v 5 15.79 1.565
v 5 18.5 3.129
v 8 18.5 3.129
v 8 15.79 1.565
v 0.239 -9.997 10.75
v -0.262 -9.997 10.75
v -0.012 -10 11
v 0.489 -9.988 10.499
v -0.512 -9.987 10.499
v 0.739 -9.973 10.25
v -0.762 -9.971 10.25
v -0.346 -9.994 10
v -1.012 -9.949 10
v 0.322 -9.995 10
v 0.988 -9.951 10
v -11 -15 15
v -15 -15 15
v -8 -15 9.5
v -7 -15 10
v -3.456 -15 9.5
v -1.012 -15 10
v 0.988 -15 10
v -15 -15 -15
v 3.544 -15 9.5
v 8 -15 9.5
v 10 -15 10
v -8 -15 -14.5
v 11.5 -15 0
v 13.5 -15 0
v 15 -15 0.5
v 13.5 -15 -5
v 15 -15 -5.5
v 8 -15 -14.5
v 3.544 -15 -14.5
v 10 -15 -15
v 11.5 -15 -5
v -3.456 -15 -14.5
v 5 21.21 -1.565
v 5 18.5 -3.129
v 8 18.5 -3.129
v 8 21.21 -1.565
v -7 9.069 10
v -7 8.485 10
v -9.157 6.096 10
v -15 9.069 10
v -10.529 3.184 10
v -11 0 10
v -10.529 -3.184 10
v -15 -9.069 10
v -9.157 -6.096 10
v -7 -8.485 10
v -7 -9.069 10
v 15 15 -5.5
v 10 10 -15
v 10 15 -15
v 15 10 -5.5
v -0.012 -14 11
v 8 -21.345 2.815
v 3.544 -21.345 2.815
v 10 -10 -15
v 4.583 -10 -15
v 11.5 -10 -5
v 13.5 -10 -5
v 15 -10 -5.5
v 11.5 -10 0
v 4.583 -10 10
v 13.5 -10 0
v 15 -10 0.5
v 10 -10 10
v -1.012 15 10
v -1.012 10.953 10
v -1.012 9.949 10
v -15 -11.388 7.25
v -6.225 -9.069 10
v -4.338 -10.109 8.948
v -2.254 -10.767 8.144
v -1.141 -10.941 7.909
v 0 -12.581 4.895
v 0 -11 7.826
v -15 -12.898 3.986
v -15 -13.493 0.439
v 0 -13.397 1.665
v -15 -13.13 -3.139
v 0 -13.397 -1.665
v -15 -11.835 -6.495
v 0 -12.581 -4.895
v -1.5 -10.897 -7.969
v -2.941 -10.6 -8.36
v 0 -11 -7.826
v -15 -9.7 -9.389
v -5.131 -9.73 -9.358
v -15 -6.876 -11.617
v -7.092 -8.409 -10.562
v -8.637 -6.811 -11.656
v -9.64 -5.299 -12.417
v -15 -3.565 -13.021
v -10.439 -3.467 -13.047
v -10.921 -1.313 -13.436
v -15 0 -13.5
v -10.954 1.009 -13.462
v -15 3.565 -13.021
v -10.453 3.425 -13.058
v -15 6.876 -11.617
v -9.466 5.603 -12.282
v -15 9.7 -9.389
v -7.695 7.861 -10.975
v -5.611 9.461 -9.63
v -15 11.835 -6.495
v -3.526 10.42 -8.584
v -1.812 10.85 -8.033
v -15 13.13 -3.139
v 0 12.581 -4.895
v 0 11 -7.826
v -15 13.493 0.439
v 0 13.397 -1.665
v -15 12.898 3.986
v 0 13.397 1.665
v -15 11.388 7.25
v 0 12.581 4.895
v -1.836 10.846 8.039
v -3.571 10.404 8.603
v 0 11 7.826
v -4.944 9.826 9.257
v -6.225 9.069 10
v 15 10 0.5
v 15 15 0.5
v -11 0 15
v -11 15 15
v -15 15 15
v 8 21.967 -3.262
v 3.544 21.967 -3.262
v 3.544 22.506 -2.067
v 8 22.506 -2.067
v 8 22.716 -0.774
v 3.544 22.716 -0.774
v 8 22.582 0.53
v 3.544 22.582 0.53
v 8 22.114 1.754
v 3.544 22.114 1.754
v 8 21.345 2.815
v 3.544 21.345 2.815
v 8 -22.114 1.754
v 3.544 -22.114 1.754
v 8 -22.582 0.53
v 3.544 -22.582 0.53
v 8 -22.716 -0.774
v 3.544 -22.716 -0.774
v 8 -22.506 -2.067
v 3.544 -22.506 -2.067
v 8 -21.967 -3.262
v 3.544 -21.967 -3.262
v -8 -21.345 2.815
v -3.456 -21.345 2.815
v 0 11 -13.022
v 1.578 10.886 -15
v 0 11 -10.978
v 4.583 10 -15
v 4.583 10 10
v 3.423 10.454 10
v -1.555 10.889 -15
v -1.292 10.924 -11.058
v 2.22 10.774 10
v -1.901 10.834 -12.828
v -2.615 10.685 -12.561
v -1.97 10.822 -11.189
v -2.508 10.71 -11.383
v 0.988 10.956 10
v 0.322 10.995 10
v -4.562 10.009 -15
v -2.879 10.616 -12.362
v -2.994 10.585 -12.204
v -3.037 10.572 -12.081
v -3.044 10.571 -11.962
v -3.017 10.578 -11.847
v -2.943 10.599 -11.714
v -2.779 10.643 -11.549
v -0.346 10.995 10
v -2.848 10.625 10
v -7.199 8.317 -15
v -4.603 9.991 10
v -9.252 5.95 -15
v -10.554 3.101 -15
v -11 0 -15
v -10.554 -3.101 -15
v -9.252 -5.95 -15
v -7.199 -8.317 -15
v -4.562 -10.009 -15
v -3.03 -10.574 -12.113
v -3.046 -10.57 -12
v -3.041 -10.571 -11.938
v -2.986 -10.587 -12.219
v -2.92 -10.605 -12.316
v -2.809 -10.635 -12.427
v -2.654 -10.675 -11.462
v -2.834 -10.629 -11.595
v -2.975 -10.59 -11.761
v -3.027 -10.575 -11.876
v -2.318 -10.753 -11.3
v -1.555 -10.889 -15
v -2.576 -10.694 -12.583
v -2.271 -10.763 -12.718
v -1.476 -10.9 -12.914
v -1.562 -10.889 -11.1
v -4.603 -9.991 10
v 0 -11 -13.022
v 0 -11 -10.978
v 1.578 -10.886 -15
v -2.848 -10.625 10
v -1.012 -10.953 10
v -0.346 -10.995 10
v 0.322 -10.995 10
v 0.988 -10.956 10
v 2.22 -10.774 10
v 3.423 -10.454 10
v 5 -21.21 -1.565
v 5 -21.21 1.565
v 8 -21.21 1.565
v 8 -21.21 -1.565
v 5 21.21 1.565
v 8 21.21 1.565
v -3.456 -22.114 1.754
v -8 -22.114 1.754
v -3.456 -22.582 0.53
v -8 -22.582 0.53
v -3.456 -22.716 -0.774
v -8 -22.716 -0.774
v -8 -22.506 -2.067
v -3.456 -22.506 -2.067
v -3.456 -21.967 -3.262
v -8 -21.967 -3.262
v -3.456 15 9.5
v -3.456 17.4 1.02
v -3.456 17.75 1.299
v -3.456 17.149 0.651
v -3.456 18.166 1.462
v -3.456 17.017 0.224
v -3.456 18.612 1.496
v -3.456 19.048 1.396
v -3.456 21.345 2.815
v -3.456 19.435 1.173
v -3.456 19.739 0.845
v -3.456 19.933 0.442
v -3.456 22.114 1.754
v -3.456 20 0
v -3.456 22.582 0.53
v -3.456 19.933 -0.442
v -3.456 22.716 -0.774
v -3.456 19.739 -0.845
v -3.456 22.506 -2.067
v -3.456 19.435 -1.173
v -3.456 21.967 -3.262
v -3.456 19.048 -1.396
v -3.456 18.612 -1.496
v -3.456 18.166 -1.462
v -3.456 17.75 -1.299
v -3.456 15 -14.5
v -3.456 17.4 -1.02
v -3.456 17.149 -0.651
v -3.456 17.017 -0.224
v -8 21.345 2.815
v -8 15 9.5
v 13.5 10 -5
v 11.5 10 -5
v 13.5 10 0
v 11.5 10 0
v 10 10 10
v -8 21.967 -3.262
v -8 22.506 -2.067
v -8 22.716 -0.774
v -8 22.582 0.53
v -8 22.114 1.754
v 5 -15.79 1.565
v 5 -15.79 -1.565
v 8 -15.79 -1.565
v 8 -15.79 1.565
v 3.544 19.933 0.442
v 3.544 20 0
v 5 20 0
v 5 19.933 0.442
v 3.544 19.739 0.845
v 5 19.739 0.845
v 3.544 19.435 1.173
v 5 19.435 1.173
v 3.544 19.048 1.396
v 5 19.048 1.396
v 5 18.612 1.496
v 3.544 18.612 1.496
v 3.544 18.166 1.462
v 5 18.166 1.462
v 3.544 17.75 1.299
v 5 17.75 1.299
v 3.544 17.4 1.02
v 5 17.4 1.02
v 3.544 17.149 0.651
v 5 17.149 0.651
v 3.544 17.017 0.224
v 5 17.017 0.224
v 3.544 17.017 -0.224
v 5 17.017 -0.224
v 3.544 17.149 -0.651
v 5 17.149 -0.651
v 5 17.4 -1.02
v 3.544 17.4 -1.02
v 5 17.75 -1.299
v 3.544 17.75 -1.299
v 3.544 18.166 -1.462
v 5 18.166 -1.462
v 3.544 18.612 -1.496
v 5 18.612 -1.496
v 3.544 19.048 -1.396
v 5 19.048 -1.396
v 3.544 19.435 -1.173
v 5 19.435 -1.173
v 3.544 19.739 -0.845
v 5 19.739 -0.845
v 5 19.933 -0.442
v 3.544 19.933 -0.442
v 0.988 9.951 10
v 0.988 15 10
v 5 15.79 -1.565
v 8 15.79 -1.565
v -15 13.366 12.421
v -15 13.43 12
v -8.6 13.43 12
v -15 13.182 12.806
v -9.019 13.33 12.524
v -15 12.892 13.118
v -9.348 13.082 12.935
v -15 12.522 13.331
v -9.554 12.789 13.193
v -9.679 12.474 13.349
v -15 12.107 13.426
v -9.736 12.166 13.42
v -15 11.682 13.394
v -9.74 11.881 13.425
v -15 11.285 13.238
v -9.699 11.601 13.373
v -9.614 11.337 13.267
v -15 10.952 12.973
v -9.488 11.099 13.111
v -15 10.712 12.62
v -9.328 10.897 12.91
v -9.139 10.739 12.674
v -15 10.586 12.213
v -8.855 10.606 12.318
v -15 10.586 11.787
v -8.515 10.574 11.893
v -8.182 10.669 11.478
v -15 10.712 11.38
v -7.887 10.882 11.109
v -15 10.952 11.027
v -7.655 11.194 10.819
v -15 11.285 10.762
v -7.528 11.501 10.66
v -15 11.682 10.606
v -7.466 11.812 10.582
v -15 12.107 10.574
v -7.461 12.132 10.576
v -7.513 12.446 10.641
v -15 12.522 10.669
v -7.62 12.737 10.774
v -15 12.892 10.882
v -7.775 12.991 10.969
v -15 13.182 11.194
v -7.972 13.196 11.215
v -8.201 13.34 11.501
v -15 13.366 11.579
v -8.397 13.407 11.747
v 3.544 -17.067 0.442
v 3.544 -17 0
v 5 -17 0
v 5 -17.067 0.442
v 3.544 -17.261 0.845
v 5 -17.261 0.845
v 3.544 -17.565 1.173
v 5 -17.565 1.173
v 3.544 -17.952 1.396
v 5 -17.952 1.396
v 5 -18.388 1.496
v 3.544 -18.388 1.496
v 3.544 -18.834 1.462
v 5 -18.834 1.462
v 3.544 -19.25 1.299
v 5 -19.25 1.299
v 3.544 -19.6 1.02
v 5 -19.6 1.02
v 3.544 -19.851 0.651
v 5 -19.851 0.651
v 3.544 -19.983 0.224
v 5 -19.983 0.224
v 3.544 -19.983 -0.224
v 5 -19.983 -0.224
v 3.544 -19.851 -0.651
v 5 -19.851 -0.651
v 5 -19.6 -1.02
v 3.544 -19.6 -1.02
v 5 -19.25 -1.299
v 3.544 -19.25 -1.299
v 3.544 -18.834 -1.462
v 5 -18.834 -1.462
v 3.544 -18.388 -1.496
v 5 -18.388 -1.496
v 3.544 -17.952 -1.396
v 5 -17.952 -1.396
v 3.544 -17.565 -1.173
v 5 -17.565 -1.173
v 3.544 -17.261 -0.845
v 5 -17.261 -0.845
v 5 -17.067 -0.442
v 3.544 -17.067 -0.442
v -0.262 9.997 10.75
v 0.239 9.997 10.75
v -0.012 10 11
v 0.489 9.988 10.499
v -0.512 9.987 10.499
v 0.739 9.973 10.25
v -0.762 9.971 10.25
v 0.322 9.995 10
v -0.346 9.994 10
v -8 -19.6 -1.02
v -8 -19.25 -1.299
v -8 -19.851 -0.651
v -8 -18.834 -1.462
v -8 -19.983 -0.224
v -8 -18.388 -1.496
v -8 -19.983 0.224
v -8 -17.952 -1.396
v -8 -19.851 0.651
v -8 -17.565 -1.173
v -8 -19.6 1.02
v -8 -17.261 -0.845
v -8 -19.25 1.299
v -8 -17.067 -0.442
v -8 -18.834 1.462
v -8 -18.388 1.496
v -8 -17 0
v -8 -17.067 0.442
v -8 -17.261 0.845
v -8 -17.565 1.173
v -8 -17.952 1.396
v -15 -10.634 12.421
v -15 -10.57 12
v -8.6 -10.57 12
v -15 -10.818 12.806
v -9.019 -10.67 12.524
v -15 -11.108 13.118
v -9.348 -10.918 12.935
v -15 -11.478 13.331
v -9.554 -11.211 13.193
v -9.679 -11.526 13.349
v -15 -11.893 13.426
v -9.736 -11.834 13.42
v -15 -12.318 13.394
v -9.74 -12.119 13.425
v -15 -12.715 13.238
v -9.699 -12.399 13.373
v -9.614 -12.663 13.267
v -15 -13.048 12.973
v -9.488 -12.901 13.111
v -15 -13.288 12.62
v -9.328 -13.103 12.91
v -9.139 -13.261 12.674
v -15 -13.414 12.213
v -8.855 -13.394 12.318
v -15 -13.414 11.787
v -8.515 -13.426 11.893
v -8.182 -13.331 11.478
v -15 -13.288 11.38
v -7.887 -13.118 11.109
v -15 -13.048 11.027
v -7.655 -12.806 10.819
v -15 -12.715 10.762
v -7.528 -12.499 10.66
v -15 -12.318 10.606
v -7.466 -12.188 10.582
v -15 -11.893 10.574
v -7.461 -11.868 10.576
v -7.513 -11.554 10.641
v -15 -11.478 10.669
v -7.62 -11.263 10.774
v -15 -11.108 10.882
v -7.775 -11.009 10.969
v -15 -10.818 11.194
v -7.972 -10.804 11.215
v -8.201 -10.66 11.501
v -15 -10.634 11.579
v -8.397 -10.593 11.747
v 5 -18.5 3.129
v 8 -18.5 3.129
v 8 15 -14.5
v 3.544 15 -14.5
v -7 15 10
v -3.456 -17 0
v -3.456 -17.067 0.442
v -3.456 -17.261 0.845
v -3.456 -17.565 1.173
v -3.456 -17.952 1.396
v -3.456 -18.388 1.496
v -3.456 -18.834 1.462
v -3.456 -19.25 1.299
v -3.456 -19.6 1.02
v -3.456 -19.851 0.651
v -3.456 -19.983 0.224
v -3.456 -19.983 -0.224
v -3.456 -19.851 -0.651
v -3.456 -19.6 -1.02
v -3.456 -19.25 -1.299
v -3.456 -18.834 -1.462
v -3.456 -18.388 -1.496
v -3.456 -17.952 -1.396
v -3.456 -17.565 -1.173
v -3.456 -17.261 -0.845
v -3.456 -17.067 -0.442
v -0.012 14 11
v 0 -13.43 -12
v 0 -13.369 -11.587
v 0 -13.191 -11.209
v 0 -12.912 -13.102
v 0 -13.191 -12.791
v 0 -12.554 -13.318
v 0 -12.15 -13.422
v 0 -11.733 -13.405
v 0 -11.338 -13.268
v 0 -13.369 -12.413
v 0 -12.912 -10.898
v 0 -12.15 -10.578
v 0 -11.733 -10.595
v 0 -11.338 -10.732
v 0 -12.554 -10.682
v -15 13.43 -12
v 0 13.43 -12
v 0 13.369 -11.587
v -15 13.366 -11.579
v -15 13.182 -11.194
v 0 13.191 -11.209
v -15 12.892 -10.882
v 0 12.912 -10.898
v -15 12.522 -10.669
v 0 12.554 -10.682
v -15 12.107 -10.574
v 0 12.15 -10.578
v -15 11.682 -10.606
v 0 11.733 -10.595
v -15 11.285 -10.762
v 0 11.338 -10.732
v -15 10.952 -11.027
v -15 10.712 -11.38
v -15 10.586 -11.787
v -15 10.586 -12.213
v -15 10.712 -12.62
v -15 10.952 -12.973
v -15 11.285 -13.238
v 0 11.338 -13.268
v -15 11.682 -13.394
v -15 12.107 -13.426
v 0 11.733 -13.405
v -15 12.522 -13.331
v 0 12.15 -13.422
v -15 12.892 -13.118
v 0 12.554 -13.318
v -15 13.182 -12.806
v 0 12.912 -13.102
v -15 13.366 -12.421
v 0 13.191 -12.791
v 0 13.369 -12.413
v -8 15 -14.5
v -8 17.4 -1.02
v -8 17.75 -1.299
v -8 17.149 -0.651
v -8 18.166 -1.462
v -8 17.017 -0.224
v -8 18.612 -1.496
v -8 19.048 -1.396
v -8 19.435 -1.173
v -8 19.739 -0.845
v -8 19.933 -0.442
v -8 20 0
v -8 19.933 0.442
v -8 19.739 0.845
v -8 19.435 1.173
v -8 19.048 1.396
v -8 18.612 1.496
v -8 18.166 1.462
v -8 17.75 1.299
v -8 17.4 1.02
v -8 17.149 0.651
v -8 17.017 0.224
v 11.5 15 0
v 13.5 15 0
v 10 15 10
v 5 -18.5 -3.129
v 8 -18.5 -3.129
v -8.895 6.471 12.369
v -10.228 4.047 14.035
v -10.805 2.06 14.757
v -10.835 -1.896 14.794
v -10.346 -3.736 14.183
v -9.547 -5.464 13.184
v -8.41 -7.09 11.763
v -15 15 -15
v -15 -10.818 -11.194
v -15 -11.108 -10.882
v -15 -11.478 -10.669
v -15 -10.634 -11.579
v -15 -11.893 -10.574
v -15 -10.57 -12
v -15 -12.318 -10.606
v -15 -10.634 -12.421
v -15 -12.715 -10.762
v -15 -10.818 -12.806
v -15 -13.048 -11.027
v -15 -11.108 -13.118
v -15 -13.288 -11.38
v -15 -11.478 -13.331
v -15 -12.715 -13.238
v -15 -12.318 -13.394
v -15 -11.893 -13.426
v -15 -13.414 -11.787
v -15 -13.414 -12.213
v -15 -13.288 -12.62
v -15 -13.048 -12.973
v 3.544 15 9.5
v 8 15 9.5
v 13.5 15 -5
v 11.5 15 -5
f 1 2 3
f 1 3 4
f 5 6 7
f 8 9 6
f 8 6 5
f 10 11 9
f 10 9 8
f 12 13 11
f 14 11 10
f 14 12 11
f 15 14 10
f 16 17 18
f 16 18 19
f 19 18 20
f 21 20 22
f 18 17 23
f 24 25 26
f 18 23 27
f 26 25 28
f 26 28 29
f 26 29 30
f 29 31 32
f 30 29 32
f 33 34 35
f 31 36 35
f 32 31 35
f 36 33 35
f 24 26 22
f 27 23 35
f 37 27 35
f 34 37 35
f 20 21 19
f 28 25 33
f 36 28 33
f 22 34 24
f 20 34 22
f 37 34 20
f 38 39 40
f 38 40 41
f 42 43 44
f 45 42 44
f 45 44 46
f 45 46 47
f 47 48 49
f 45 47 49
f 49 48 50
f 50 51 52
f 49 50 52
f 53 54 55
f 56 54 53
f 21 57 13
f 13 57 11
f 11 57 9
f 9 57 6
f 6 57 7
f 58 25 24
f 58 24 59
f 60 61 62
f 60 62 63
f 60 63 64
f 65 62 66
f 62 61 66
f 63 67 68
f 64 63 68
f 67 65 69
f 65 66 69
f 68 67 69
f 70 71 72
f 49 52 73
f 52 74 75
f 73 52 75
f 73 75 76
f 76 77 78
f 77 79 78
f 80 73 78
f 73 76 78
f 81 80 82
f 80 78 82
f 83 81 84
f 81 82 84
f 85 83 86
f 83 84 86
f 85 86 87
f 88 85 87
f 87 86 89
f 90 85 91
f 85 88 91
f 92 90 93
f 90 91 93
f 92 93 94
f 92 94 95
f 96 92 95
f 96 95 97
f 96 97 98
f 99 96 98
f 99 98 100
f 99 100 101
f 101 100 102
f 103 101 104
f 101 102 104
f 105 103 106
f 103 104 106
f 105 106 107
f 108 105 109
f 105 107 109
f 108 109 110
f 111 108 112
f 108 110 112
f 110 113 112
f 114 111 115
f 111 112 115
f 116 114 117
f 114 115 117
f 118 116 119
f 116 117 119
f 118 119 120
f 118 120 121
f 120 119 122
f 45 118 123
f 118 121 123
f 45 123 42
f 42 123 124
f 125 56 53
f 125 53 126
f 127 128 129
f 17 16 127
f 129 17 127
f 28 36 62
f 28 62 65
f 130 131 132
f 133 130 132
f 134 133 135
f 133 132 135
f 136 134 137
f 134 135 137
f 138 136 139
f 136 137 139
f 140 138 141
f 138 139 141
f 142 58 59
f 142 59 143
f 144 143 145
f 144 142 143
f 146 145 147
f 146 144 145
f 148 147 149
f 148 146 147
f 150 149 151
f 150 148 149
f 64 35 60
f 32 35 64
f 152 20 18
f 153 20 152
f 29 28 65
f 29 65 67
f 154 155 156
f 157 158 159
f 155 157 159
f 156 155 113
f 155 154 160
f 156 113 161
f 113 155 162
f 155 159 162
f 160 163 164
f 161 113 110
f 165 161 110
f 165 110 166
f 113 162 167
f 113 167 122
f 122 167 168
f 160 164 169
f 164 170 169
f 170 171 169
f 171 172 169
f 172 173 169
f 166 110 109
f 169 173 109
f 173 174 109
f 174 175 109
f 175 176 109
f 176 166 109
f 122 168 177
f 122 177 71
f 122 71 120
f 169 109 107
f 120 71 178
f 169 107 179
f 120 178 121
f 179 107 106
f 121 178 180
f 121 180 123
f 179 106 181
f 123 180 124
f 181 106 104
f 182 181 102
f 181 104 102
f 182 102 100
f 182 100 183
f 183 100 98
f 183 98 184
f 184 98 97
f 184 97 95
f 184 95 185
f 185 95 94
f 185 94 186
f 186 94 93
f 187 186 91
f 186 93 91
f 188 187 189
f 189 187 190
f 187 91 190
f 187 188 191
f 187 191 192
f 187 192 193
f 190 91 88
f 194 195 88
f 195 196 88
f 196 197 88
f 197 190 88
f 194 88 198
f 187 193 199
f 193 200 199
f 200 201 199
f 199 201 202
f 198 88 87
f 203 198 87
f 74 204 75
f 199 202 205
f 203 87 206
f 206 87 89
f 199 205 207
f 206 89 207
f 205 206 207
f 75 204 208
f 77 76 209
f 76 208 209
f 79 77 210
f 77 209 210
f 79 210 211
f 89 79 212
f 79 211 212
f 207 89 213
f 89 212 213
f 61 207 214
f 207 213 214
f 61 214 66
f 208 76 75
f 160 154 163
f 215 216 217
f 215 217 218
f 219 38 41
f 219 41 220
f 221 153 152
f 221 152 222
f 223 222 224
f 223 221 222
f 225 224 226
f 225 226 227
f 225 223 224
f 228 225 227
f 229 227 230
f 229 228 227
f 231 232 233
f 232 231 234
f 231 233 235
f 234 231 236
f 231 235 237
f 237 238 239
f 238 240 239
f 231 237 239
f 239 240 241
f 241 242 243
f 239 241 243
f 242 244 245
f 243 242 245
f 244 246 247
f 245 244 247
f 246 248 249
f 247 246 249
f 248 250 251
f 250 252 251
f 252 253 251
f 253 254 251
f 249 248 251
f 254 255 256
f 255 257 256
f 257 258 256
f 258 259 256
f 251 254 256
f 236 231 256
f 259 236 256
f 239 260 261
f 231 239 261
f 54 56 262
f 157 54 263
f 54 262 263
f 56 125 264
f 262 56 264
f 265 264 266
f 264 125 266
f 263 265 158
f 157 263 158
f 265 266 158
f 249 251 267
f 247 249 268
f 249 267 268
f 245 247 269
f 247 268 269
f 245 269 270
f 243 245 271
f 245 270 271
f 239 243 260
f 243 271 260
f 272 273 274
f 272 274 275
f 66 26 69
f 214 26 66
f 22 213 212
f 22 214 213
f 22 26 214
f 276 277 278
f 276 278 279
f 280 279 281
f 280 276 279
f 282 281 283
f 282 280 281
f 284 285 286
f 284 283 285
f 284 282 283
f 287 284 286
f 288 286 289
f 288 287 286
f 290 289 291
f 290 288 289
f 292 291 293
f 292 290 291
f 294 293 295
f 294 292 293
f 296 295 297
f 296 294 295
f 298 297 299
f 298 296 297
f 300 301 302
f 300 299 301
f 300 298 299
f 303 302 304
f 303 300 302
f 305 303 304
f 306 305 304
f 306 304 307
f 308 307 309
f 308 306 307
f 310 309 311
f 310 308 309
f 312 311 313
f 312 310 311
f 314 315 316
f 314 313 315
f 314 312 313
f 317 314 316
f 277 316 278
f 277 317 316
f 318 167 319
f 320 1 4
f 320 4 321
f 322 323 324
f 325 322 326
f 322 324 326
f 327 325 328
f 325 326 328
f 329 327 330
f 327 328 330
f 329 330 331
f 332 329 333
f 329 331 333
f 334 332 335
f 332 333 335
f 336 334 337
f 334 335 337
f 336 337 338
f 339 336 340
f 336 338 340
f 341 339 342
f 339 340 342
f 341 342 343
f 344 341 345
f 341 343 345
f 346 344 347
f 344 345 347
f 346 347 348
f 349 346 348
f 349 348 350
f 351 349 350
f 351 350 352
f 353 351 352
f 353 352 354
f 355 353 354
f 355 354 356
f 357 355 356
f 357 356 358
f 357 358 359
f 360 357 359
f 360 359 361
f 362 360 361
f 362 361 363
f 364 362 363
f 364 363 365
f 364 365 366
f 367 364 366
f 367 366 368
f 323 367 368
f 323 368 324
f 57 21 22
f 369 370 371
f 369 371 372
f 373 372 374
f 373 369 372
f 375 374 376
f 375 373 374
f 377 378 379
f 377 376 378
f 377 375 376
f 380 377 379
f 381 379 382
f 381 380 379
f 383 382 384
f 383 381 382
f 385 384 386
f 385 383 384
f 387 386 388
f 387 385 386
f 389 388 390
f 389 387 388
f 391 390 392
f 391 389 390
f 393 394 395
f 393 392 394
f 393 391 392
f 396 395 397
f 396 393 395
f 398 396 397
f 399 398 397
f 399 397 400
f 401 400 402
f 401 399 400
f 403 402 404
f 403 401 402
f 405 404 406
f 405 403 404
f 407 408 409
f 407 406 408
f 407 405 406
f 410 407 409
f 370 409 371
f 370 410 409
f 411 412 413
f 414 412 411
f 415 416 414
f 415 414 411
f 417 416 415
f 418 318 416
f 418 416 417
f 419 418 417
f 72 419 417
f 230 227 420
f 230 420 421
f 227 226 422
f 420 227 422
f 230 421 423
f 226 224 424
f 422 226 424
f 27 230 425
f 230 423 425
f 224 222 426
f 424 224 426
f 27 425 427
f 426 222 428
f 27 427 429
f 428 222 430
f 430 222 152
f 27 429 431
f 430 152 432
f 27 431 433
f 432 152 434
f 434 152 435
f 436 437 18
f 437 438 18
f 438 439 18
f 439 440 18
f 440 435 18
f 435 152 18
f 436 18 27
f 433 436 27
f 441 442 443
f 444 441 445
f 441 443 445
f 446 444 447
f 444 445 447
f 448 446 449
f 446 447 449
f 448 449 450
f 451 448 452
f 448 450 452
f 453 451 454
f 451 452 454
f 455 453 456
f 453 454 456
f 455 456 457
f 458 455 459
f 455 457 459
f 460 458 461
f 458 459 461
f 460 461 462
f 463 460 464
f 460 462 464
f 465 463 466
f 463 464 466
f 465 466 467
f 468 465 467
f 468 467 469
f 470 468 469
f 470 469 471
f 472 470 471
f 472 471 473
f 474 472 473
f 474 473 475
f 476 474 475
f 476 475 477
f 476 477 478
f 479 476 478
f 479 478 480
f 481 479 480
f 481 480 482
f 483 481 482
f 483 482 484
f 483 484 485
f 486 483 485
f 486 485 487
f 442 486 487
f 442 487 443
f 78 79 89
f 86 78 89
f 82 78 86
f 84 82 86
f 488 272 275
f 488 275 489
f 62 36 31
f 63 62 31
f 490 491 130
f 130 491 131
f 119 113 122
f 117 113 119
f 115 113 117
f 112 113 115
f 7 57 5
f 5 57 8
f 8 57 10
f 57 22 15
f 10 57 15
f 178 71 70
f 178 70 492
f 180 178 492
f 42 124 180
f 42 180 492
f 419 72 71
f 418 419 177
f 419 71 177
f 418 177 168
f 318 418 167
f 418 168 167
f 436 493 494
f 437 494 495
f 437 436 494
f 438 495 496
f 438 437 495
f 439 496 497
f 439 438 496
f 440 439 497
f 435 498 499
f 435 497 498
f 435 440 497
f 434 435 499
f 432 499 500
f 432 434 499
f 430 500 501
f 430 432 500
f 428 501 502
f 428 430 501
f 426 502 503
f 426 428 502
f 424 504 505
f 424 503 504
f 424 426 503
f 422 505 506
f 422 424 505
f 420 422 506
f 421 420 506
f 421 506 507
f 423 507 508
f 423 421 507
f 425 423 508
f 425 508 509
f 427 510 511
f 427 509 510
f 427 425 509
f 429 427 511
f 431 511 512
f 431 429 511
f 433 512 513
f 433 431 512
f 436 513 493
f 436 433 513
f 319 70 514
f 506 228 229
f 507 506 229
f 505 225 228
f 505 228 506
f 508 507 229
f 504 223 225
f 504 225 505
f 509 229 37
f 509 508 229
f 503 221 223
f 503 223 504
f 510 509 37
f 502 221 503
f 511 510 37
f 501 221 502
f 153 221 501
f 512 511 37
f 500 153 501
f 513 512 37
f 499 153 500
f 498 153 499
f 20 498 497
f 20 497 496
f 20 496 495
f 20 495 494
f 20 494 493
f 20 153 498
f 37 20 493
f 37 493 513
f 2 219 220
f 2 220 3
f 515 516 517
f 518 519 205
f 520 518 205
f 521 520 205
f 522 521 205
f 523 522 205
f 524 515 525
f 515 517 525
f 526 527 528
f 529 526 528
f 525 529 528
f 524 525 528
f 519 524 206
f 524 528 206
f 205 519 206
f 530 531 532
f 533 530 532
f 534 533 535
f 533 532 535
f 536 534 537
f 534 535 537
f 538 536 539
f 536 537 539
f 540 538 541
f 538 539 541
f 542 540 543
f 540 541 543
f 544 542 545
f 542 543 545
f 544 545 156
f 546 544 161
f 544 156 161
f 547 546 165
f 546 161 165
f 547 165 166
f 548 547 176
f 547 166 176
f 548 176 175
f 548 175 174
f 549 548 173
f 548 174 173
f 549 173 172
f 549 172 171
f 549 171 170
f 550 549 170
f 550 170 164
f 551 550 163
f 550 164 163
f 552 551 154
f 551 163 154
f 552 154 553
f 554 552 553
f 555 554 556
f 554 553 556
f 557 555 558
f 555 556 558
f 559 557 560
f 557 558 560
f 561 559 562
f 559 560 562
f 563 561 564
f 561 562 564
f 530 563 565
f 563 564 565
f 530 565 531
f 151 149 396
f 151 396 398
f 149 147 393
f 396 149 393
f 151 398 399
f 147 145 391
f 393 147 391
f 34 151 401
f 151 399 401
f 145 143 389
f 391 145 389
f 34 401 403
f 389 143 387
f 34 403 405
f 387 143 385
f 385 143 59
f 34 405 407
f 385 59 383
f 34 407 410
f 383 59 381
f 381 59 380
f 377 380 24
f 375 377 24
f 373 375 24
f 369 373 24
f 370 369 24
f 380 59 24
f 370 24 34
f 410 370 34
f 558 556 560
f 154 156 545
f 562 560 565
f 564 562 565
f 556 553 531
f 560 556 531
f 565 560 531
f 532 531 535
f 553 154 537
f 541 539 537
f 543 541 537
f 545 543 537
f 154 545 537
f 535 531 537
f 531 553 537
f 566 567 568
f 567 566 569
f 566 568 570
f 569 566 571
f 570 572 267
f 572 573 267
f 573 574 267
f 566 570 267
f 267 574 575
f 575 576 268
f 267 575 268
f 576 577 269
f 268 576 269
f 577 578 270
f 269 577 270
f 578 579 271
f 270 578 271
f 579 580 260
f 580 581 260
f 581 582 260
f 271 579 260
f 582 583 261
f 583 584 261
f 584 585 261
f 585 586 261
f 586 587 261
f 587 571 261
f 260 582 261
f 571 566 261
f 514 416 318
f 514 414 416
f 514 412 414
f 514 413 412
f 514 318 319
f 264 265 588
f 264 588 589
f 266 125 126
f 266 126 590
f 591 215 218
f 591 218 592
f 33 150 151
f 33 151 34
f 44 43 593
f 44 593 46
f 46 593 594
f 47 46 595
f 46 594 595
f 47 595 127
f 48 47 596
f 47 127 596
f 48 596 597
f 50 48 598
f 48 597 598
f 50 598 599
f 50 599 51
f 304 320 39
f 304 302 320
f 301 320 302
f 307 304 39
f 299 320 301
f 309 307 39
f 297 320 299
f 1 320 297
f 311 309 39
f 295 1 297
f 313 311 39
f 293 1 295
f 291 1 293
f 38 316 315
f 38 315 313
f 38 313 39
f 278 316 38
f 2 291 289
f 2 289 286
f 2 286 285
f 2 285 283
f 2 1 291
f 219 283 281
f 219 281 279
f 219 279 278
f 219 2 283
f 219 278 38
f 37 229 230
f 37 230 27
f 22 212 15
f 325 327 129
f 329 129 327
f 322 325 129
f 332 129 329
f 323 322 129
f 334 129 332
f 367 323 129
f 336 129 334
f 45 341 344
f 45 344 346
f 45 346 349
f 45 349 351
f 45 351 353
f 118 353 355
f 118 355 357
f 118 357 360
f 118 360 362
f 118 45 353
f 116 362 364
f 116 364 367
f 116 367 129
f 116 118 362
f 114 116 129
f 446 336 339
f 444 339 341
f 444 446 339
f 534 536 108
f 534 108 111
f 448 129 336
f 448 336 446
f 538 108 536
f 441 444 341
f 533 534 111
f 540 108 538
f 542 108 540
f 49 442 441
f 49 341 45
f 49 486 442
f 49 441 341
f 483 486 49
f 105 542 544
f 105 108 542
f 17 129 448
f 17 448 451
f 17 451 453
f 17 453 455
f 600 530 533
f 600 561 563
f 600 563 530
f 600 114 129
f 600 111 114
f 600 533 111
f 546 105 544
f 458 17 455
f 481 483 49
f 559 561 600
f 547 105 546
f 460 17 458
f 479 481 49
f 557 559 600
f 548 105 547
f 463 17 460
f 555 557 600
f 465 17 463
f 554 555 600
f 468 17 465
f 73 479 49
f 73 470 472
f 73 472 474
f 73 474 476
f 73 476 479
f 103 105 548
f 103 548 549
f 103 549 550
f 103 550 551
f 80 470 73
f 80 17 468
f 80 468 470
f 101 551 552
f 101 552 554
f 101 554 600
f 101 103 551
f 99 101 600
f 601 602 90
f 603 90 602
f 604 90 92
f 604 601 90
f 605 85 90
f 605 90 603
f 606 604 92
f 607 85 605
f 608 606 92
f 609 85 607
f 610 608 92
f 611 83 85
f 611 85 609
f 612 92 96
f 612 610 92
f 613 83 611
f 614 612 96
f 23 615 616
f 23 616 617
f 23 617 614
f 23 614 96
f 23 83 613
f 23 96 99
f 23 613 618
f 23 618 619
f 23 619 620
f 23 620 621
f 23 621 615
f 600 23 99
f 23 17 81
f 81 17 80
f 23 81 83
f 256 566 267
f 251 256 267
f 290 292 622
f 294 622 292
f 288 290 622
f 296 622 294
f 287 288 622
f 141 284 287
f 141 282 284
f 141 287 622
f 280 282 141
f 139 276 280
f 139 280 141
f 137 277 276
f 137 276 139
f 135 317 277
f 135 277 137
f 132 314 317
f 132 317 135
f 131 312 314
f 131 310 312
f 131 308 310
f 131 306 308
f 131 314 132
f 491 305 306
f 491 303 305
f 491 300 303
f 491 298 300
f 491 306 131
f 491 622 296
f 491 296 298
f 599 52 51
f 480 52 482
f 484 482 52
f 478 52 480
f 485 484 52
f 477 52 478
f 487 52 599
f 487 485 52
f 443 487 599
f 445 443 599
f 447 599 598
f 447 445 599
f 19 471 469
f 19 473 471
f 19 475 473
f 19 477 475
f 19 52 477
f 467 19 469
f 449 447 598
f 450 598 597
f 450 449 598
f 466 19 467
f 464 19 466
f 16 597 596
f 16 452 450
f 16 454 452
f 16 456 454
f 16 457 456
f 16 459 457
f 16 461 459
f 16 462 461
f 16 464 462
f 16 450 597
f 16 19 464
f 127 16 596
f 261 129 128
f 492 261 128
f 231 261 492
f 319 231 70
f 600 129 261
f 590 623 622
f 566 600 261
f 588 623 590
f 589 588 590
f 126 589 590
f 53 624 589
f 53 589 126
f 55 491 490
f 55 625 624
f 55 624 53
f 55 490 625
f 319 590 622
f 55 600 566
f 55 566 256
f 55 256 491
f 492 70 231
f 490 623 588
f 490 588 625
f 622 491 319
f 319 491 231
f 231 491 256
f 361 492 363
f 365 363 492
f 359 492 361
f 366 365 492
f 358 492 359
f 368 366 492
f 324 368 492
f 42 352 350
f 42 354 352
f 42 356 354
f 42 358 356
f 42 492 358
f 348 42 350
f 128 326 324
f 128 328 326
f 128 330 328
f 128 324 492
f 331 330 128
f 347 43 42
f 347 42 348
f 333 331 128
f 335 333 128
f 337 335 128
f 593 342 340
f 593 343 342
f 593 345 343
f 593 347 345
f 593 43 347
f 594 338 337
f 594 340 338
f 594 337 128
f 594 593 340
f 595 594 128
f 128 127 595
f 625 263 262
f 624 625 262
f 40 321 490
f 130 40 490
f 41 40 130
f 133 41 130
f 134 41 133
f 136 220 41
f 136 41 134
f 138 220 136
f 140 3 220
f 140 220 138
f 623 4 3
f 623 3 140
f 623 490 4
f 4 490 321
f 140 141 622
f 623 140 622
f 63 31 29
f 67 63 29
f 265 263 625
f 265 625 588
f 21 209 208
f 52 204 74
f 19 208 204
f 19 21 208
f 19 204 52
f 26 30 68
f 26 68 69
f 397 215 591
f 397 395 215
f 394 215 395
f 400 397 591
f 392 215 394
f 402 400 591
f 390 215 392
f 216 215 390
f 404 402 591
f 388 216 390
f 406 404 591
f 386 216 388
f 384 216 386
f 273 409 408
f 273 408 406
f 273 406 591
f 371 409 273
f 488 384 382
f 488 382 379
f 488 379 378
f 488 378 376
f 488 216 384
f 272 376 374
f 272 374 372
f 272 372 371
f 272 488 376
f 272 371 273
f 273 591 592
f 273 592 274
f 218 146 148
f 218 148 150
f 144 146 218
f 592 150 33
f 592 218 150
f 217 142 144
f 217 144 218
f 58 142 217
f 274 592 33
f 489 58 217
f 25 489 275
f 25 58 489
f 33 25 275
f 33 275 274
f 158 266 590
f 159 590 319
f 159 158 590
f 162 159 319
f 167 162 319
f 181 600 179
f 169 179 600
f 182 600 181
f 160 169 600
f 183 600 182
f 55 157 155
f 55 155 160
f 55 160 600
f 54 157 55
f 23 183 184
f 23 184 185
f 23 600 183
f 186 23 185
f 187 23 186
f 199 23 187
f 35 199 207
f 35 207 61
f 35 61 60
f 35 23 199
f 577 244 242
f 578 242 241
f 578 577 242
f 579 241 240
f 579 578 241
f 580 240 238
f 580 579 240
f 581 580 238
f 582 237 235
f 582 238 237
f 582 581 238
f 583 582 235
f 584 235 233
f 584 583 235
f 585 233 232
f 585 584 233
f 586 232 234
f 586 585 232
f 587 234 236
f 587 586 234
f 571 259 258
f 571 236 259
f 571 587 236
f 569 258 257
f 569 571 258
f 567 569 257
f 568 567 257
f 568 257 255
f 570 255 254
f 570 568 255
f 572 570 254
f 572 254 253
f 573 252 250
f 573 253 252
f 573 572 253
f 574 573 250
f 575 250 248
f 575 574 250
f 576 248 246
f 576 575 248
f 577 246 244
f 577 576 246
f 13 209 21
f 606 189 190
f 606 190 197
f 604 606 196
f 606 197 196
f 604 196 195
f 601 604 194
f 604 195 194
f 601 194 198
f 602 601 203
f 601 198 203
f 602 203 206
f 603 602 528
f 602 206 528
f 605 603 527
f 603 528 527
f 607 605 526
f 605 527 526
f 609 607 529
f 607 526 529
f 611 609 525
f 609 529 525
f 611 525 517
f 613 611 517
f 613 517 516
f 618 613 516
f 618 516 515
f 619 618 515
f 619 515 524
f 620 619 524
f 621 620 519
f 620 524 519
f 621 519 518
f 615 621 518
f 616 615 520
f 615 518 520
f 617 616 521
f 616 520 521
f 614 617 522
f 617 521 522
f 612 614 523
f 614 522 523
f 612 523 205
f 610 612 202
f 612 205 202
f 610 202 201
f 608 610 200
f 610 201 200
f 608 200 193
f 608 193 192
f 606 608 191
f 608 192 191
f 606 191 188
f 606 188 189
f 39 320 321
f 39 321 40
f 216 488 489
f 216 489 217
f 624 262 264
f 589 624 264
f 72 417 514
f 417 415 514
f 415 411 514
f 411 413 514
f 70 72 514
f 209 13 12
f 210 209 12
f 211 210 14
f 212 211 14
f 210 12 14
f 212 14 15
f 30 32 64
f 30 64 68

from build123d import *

# Parameters (mm, degrees)
F0_W      = 2
F0_H      = 5
F5_DEPTH  = 15
F6_DEPTH  = 15
F7_DEPTH  = 16
F2_R      = 1.43
F8_DEPTH  = 25
F9_DEPTH  = 25
F3_R      = 1.5
F10_DEPTH = 8
F11_START = 5
F11_DEPTH = 20
F4_W      = 7
F4_H      = 12
F12_DEPTH = 20
F14_START = 10
F13_W     = 2
F13_H     = 30
F14_DEPTH = 1
F15_R     = 10
F16_DEPTH = 25
F17_SIZE  = 0.9999


# Not quite as in the source:
# - a fillet or chamfer is up to 0.001 mm smaller than in the source, because OpenCascade refuses the exact size


with BuildPart() as f5:
    # F0 (on Front) → F5 (new body, symmetric)
    with BuildSketch(Plane.XZ):
        Polygon((-11, 15), (-15, 15), (-15, -15), (10, -15), (10, 10), (-7, 10), align=None)
        Polygon((10, 10), (10, -15), (15, -5.5), (15, 0.5), align=None)
        with Locations((12.5, -2.5)):
            Rectangle(F0_W, F0_H, mode=Mode.SUBTRACT)
    extrude(amount=F5_DEPTH, both=True)

    # F1 (on Top) → F6 (cut, symmetric)
    with BuildSketch(Plane.XY):
        with BuildLine():
            Line((16, 10), (4.582575695, 10))
            ThreePointArc((4.582575695, 10), (-11, 0), (4.582575695, -10))
            Line((4.582575695, -10), (16, -10))
            Line((16, -10), (16, 10))
        make_face()
    extrude(amount=F6_DEPTH, both=True, mode=Mode.SUBTRACT)

    # F2 (on Right) → F7 (cut)
    with BuildSketch(Plane.YZ):
        with BuildLine():
            Line((9.0691785736, 10), (-9.0691785736, 10))
            ThreePointArc((-9.0691785736, 10), (0, -13.5), (9.0691785736, 10))
        make_face()
    extrude(amount=-F7_DEPTH, mode=Mode.SUBTRACT)

    # F2 (on Right) → F8 (cut)
    with BuildSketch(Plane.YZ):
        with Locations((12, 12)):
            Circle(F2_R)
        with Locations((-12, 12)):
            Circle(F2_R)
    extrude(amount=-F8_DEPTH, mode=Mode.SUBTRACT)

    # F2 (on Right) → F9 (cut)
    with BuildSketch(Plane.YZ):
        with Locations((12, -12)):
            Circle(F2_R)
        with Locations((-12, -12)):
            Circle(F2_R)
    extrude(amount=-F9_DEPTH, mode=Mode.SUBTRACT)

    # F3 (on Right) → F10 (join, symmetric)
    with BuildSketch(Plane.YZ):
        with BuildLine():
            Line((15, -14.5), (21.9673867507, -3.2620052331))
            ThreePointArc((21.9673867507, -3.2620052331), (22.6917908233, -0.1175906407), (21.3446249631, 2.8145158605))
            Line((21.3446249631, 2.8145158605), (15, 9.5))
            Line((15, 9.5), (15, -14.5))
        make_face()
        Polygon((18.5, 3.129238459), (21.21, 1.5646192295), (21.21, -1.5646192295), (18.5, -3.129238459), (15.79, -1.5646192295), (15.79, 1.5646192295), align=None, mode=Mode.SUBTRACT)
        Polygon((21.21, -1.5646192295), (21.21, 1.5646192295), (18.5, 3.129238459), (15.79, 1.5646192295), (15.79, -1.5646192295), (18.5, -3.129238459), align=None)
        with Locations((18.5, 0)):
            Circle(F3_R, mode=Mode.SUBTRACT)
        with BuildLine():
            Line((-15, 9.5), (-21.3446249631, 2.8145158605))
            ThreePointArc((-21.3446249631, 2.8145158605), (-22.6917908233, -0.1175906407), (-21.9673867507, -3.2620052331))
            Line((-21.9673867507, -3.2620052331), (-15, -14.5))
            Line((-15, -14.5), (-15, 9.5))
        make_face()
        Polygon((-21.21, 1.5646192295), (-18.5, 3.129238459), (-15.79, 1.5646192295), (-15.79, -1.5646192295), (-18.5, -3.129238459), (-21.21, -1.5646192295), align=None, mode=Mode.SUBTRACT)
        Polygon((-15.79, 1.5646192295), (-18.5, 3.129238459), (-21.21, 1.5646192295), (-21.21, -1.5646192295), (-18.5, -3.129238459), (-15.79, -1.5646192295), align=None)
        with Locations((-18.5, 0)):
            Circle(F3_R, mode=Mode.SUBTRACT)
    extrude(amount=F10_DEPTH, both=True)

    # F3 (on Right) → F11 (cut)
    with BuildSketch(Plane.YZ.offset(F11_START)):
        Polygon((21.21, -1.5646192295), (21.21, 1.5646192295), (18.5, 3.129238459), (15.79, 1.5646192295), (15.79, -1.5646192295), (18.5, -3.129238459), align=None)
        with Locations((18.5, 0)):
            Circle(F3_R, mode=Mode.SUBTRACT)
        with Locations((18.5, 0)):
            Circle(F3_R)
        Polygon((-15.79, 1.5646192295), (-18.5, 3.129238459), (-21.21, 1.5646192295), (-21.21, -1.5646192295), (-18.5, -3.129238459), (-15.79, -1.5646192295), align=None)
        with Locations((-18.5, 0)):
            Circle(F3_R, mode=Mode.SUBTRACT)
        with Locations((-18.5, 0)):
            Circle(F3_R)
    extrude(amount=F11_DEPTH, mode=Mode.SUBTRACT)

    # F4 (on Top) → F12 (cut, symmetric)
    with BuildSketch(Plane.XY):
        with Locations((0.0437486451, 21)):
            Rectangle(F4_W, F4_H)
        with Locations((0.0437486451, -21)):
            Rectangle(F4_W, F4_H)
    extrude(amount=F12_DEPTH, both=True, mode=Mode.SUBTRACT)

    # F13 (on Top) → F14 (join)
    with BuildSketch(Plane.XY.offset(F14_START)):
        with Locations((-0.0117724412, 0)):
            Rectangle(F13_W, F13_H)
    extrude(amount=F14_DEPTH)

    # F15 (on Top) → F16 (cut)
    with BuildSketch(Plane.XY):
        Circle(F15_R)
    extrude(amount=F16_DEPTH, mode=Mode.SUBTRACT)

    # F17 (size 1 in the source; OpenCascade refuses exactly that, so slightly less here)
    f17_edges = [f5.edges().sort_by_distance(p)[0] for p in [
        (0.988228, 12.475525, 11),
        (-1.011772, 12.474342, 11),
        (-0.011772, 15, 11),
        (0.988228, -12.475525, 11),
        (-0.011772, -15, 11),
        (-1.011772, -12.474342, 11),
    ]]
    chamfer(f17_edges, length=F17_SIZE)


solid = f5.part
